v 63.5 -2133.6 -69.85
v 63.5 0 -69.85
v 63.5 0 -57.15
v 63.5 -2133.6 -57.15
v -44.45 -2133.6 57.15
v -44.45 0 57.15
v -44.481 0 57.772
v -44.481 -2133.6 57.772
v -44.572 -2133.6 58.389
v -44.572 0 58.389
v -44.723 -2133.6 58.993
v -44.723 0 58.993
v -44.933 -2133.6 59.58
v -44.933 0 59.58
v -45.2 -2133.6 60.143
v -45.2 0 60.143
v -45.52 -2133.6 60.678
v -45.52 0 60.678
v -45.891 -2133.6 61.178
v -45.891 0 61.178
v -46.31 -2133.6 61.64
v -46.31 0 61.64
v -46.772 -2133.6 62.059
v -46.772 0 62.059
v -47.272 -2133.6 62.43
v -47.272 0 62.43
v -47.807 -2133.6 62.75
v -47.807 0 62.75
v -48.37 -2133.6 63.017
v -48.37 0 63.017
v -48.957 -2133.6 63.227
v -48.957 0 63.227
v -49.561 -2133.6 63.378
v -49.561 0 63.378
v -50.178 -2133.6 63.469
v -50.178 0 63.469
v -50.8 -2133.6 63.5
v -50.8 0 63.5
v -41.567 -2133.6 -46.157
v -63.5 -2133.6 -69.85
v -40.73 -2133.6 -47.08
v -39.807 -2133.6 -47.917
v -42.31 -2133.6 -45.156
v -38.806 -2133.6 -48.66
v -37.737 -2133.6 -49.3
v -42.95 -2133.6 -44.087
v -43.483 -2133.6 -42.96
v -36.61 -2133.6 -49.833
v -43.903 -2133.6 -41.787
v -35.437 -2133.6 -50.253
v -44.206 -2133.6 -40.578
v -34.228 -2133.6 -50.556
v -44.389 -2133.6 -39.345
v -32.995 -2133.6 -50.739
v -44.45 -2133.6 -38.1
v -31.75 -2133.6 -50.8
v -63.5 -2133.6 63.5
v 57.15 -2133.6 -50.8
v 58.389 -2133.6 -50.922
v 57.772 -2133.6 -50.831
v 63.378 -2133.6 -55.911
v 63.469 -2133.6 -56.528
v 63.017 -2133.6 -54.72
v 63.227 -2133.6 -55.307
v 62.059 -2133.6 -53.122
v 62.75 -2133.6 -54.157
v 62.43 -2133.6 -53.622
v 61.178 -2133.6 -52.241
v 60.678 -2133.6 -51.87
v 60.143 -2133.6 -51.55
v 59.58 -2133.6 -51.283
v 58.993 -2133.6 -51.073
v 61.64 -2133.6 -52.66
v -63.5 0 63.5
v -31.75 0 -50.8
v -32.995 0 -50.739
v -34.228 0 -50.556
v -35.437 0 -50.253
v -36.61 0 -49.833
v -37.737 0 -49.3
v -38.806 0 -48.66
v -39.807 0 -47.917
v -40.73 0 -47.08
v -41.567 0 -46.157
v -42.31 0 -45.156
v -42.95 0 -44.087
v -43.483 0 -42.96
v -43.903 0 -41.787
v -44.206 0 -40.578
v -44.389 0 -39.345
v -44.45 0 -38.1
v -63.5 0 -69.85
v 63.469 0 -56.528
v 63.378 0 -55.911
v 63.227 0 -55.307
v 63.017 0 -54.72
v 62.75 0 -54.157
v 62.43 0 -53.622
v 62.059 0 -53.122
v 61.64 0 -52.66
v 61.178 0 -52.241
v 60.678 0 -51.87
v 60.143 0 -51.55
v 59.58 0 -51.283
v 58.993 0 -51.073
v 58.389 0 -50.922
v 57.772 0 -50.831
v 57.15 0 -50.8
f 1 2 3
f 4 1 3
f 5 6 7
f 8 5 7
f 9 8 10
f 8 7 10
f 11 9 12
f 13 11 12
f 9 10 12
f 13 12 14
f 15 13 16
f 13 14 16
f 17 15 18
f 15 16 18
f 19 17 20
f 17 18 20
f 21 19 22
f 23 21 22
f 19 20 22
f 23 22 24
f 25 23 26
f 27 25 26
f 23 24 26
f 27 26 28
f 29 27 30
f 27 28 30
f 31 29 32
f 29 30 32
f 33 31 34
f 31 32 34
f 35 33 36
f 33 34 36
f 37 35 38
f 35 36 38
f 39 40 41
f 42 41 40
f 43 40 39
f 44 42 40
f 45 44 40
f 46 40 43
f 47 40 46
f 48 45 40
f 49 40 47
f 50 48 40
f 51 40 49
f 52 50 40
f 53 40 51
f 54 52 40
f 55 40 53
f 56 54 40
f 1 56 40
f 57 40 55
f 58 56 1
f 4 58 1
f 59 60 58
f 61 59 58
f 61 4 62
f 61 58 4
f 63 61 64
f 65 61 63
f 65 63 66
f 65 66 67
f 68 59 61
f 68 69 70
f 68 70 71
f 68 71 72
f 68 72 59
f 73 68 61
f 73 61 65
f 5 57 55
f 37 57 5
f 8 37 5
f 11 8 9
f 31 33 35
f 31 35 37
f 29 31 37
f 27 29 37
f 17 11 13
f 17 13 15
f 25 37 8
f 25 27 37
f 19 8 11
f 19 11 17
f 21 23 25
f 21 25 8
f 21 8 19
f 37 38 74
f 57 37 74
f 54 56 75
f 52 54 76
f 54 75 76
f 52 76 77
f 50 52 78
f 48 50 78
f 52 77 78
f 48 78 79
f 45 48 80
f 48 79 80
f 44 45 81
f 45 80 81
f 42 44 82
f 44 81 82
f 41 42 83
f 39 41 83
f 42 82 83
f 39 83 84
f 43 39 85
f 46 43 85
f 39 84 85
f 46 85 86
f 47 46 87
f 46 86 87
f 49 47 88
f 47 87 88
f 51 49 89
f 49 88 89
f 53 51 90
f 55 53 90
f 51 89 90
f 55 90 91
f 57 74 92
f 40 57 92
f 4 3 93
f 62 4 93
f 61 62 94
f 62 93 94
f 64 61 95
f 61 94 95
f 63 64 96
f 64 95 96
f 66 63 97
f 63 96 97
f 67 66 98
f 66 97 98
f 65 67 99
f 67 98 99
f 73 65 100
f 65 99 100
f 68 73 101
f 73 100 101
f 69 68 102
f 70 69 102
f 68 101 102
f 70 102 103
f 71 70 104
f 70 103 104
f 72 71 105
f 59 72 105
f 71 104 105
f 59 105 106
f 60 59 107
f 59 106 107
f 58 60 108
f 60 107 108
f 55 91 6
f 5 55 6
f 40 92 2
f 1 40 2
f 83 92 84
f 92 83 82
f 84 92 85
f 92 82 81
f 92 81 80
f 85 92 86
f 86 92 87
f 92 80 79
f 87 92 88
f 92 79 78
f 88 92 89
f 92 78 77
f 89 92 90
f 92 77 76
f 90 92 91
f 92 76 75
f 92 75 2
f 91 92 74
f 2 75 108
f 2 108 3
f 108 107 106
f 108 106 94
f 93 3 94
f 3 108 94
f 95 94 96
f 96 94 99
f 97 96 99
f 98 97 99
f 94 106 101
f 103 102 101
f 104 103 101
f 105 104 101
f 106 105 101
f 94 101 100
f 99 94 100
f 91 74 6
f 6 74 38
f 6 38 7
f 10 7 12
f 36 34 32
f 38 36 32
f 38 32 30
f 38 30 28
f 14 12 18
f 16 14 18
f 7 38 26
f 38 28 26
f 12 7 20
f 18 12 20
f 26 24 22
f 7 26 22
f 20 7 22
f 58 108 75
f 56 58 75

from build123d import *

# Parameters (mm, degrees)
F1_DEPTH = 2133.6


with BuildPart() as f1:
    # F0 (on Front) → F1 (new body)
    with BuildSketch(Plane.XZ):
        with BuildLine():
            Line((-44.45, -38.1), (-44.45, 0))
            Line((-44.45, 0), (-63.5, 0))
            Line((-63.5, 0), (-63.5, -44.45))
            Line((-63.5, -44.45), (-63.5, -69.85))
            Line((-63.5, -69.85), (-44.45, -69.85))
            Line((-44.45, -69.85), (63.5, -69.85))
            Line((63.5, -69.85), (63.5, -57.15))
            ThreePointArc((63.5, -57.15), (61.640128, -52.659872), (57.15, -50.8))
            Line((57.15, -50.8), (-31.75, -50.8))
            ThreePointArc((-31.75, -50.8), (-40.730256, -47.080256), (-44.45, -38.1))
        make_face()
        with BuildLine():
            Line((-63.5, 0), (-44.45, 0))
            Line((-44.45, 0), (-44.45, 57.15))
            ThreePointArc((-44.45, 57.15), (-46.309872, 61.640128), (-50.8, 63.5))
            Line((-50.8, 63.5), (-63.5, 63.5))
            Line((-63.5, 63.5), (-63.5, 0))
        make_face()
    extrude(amount=F1_DEPTH)


solid = f1.part
